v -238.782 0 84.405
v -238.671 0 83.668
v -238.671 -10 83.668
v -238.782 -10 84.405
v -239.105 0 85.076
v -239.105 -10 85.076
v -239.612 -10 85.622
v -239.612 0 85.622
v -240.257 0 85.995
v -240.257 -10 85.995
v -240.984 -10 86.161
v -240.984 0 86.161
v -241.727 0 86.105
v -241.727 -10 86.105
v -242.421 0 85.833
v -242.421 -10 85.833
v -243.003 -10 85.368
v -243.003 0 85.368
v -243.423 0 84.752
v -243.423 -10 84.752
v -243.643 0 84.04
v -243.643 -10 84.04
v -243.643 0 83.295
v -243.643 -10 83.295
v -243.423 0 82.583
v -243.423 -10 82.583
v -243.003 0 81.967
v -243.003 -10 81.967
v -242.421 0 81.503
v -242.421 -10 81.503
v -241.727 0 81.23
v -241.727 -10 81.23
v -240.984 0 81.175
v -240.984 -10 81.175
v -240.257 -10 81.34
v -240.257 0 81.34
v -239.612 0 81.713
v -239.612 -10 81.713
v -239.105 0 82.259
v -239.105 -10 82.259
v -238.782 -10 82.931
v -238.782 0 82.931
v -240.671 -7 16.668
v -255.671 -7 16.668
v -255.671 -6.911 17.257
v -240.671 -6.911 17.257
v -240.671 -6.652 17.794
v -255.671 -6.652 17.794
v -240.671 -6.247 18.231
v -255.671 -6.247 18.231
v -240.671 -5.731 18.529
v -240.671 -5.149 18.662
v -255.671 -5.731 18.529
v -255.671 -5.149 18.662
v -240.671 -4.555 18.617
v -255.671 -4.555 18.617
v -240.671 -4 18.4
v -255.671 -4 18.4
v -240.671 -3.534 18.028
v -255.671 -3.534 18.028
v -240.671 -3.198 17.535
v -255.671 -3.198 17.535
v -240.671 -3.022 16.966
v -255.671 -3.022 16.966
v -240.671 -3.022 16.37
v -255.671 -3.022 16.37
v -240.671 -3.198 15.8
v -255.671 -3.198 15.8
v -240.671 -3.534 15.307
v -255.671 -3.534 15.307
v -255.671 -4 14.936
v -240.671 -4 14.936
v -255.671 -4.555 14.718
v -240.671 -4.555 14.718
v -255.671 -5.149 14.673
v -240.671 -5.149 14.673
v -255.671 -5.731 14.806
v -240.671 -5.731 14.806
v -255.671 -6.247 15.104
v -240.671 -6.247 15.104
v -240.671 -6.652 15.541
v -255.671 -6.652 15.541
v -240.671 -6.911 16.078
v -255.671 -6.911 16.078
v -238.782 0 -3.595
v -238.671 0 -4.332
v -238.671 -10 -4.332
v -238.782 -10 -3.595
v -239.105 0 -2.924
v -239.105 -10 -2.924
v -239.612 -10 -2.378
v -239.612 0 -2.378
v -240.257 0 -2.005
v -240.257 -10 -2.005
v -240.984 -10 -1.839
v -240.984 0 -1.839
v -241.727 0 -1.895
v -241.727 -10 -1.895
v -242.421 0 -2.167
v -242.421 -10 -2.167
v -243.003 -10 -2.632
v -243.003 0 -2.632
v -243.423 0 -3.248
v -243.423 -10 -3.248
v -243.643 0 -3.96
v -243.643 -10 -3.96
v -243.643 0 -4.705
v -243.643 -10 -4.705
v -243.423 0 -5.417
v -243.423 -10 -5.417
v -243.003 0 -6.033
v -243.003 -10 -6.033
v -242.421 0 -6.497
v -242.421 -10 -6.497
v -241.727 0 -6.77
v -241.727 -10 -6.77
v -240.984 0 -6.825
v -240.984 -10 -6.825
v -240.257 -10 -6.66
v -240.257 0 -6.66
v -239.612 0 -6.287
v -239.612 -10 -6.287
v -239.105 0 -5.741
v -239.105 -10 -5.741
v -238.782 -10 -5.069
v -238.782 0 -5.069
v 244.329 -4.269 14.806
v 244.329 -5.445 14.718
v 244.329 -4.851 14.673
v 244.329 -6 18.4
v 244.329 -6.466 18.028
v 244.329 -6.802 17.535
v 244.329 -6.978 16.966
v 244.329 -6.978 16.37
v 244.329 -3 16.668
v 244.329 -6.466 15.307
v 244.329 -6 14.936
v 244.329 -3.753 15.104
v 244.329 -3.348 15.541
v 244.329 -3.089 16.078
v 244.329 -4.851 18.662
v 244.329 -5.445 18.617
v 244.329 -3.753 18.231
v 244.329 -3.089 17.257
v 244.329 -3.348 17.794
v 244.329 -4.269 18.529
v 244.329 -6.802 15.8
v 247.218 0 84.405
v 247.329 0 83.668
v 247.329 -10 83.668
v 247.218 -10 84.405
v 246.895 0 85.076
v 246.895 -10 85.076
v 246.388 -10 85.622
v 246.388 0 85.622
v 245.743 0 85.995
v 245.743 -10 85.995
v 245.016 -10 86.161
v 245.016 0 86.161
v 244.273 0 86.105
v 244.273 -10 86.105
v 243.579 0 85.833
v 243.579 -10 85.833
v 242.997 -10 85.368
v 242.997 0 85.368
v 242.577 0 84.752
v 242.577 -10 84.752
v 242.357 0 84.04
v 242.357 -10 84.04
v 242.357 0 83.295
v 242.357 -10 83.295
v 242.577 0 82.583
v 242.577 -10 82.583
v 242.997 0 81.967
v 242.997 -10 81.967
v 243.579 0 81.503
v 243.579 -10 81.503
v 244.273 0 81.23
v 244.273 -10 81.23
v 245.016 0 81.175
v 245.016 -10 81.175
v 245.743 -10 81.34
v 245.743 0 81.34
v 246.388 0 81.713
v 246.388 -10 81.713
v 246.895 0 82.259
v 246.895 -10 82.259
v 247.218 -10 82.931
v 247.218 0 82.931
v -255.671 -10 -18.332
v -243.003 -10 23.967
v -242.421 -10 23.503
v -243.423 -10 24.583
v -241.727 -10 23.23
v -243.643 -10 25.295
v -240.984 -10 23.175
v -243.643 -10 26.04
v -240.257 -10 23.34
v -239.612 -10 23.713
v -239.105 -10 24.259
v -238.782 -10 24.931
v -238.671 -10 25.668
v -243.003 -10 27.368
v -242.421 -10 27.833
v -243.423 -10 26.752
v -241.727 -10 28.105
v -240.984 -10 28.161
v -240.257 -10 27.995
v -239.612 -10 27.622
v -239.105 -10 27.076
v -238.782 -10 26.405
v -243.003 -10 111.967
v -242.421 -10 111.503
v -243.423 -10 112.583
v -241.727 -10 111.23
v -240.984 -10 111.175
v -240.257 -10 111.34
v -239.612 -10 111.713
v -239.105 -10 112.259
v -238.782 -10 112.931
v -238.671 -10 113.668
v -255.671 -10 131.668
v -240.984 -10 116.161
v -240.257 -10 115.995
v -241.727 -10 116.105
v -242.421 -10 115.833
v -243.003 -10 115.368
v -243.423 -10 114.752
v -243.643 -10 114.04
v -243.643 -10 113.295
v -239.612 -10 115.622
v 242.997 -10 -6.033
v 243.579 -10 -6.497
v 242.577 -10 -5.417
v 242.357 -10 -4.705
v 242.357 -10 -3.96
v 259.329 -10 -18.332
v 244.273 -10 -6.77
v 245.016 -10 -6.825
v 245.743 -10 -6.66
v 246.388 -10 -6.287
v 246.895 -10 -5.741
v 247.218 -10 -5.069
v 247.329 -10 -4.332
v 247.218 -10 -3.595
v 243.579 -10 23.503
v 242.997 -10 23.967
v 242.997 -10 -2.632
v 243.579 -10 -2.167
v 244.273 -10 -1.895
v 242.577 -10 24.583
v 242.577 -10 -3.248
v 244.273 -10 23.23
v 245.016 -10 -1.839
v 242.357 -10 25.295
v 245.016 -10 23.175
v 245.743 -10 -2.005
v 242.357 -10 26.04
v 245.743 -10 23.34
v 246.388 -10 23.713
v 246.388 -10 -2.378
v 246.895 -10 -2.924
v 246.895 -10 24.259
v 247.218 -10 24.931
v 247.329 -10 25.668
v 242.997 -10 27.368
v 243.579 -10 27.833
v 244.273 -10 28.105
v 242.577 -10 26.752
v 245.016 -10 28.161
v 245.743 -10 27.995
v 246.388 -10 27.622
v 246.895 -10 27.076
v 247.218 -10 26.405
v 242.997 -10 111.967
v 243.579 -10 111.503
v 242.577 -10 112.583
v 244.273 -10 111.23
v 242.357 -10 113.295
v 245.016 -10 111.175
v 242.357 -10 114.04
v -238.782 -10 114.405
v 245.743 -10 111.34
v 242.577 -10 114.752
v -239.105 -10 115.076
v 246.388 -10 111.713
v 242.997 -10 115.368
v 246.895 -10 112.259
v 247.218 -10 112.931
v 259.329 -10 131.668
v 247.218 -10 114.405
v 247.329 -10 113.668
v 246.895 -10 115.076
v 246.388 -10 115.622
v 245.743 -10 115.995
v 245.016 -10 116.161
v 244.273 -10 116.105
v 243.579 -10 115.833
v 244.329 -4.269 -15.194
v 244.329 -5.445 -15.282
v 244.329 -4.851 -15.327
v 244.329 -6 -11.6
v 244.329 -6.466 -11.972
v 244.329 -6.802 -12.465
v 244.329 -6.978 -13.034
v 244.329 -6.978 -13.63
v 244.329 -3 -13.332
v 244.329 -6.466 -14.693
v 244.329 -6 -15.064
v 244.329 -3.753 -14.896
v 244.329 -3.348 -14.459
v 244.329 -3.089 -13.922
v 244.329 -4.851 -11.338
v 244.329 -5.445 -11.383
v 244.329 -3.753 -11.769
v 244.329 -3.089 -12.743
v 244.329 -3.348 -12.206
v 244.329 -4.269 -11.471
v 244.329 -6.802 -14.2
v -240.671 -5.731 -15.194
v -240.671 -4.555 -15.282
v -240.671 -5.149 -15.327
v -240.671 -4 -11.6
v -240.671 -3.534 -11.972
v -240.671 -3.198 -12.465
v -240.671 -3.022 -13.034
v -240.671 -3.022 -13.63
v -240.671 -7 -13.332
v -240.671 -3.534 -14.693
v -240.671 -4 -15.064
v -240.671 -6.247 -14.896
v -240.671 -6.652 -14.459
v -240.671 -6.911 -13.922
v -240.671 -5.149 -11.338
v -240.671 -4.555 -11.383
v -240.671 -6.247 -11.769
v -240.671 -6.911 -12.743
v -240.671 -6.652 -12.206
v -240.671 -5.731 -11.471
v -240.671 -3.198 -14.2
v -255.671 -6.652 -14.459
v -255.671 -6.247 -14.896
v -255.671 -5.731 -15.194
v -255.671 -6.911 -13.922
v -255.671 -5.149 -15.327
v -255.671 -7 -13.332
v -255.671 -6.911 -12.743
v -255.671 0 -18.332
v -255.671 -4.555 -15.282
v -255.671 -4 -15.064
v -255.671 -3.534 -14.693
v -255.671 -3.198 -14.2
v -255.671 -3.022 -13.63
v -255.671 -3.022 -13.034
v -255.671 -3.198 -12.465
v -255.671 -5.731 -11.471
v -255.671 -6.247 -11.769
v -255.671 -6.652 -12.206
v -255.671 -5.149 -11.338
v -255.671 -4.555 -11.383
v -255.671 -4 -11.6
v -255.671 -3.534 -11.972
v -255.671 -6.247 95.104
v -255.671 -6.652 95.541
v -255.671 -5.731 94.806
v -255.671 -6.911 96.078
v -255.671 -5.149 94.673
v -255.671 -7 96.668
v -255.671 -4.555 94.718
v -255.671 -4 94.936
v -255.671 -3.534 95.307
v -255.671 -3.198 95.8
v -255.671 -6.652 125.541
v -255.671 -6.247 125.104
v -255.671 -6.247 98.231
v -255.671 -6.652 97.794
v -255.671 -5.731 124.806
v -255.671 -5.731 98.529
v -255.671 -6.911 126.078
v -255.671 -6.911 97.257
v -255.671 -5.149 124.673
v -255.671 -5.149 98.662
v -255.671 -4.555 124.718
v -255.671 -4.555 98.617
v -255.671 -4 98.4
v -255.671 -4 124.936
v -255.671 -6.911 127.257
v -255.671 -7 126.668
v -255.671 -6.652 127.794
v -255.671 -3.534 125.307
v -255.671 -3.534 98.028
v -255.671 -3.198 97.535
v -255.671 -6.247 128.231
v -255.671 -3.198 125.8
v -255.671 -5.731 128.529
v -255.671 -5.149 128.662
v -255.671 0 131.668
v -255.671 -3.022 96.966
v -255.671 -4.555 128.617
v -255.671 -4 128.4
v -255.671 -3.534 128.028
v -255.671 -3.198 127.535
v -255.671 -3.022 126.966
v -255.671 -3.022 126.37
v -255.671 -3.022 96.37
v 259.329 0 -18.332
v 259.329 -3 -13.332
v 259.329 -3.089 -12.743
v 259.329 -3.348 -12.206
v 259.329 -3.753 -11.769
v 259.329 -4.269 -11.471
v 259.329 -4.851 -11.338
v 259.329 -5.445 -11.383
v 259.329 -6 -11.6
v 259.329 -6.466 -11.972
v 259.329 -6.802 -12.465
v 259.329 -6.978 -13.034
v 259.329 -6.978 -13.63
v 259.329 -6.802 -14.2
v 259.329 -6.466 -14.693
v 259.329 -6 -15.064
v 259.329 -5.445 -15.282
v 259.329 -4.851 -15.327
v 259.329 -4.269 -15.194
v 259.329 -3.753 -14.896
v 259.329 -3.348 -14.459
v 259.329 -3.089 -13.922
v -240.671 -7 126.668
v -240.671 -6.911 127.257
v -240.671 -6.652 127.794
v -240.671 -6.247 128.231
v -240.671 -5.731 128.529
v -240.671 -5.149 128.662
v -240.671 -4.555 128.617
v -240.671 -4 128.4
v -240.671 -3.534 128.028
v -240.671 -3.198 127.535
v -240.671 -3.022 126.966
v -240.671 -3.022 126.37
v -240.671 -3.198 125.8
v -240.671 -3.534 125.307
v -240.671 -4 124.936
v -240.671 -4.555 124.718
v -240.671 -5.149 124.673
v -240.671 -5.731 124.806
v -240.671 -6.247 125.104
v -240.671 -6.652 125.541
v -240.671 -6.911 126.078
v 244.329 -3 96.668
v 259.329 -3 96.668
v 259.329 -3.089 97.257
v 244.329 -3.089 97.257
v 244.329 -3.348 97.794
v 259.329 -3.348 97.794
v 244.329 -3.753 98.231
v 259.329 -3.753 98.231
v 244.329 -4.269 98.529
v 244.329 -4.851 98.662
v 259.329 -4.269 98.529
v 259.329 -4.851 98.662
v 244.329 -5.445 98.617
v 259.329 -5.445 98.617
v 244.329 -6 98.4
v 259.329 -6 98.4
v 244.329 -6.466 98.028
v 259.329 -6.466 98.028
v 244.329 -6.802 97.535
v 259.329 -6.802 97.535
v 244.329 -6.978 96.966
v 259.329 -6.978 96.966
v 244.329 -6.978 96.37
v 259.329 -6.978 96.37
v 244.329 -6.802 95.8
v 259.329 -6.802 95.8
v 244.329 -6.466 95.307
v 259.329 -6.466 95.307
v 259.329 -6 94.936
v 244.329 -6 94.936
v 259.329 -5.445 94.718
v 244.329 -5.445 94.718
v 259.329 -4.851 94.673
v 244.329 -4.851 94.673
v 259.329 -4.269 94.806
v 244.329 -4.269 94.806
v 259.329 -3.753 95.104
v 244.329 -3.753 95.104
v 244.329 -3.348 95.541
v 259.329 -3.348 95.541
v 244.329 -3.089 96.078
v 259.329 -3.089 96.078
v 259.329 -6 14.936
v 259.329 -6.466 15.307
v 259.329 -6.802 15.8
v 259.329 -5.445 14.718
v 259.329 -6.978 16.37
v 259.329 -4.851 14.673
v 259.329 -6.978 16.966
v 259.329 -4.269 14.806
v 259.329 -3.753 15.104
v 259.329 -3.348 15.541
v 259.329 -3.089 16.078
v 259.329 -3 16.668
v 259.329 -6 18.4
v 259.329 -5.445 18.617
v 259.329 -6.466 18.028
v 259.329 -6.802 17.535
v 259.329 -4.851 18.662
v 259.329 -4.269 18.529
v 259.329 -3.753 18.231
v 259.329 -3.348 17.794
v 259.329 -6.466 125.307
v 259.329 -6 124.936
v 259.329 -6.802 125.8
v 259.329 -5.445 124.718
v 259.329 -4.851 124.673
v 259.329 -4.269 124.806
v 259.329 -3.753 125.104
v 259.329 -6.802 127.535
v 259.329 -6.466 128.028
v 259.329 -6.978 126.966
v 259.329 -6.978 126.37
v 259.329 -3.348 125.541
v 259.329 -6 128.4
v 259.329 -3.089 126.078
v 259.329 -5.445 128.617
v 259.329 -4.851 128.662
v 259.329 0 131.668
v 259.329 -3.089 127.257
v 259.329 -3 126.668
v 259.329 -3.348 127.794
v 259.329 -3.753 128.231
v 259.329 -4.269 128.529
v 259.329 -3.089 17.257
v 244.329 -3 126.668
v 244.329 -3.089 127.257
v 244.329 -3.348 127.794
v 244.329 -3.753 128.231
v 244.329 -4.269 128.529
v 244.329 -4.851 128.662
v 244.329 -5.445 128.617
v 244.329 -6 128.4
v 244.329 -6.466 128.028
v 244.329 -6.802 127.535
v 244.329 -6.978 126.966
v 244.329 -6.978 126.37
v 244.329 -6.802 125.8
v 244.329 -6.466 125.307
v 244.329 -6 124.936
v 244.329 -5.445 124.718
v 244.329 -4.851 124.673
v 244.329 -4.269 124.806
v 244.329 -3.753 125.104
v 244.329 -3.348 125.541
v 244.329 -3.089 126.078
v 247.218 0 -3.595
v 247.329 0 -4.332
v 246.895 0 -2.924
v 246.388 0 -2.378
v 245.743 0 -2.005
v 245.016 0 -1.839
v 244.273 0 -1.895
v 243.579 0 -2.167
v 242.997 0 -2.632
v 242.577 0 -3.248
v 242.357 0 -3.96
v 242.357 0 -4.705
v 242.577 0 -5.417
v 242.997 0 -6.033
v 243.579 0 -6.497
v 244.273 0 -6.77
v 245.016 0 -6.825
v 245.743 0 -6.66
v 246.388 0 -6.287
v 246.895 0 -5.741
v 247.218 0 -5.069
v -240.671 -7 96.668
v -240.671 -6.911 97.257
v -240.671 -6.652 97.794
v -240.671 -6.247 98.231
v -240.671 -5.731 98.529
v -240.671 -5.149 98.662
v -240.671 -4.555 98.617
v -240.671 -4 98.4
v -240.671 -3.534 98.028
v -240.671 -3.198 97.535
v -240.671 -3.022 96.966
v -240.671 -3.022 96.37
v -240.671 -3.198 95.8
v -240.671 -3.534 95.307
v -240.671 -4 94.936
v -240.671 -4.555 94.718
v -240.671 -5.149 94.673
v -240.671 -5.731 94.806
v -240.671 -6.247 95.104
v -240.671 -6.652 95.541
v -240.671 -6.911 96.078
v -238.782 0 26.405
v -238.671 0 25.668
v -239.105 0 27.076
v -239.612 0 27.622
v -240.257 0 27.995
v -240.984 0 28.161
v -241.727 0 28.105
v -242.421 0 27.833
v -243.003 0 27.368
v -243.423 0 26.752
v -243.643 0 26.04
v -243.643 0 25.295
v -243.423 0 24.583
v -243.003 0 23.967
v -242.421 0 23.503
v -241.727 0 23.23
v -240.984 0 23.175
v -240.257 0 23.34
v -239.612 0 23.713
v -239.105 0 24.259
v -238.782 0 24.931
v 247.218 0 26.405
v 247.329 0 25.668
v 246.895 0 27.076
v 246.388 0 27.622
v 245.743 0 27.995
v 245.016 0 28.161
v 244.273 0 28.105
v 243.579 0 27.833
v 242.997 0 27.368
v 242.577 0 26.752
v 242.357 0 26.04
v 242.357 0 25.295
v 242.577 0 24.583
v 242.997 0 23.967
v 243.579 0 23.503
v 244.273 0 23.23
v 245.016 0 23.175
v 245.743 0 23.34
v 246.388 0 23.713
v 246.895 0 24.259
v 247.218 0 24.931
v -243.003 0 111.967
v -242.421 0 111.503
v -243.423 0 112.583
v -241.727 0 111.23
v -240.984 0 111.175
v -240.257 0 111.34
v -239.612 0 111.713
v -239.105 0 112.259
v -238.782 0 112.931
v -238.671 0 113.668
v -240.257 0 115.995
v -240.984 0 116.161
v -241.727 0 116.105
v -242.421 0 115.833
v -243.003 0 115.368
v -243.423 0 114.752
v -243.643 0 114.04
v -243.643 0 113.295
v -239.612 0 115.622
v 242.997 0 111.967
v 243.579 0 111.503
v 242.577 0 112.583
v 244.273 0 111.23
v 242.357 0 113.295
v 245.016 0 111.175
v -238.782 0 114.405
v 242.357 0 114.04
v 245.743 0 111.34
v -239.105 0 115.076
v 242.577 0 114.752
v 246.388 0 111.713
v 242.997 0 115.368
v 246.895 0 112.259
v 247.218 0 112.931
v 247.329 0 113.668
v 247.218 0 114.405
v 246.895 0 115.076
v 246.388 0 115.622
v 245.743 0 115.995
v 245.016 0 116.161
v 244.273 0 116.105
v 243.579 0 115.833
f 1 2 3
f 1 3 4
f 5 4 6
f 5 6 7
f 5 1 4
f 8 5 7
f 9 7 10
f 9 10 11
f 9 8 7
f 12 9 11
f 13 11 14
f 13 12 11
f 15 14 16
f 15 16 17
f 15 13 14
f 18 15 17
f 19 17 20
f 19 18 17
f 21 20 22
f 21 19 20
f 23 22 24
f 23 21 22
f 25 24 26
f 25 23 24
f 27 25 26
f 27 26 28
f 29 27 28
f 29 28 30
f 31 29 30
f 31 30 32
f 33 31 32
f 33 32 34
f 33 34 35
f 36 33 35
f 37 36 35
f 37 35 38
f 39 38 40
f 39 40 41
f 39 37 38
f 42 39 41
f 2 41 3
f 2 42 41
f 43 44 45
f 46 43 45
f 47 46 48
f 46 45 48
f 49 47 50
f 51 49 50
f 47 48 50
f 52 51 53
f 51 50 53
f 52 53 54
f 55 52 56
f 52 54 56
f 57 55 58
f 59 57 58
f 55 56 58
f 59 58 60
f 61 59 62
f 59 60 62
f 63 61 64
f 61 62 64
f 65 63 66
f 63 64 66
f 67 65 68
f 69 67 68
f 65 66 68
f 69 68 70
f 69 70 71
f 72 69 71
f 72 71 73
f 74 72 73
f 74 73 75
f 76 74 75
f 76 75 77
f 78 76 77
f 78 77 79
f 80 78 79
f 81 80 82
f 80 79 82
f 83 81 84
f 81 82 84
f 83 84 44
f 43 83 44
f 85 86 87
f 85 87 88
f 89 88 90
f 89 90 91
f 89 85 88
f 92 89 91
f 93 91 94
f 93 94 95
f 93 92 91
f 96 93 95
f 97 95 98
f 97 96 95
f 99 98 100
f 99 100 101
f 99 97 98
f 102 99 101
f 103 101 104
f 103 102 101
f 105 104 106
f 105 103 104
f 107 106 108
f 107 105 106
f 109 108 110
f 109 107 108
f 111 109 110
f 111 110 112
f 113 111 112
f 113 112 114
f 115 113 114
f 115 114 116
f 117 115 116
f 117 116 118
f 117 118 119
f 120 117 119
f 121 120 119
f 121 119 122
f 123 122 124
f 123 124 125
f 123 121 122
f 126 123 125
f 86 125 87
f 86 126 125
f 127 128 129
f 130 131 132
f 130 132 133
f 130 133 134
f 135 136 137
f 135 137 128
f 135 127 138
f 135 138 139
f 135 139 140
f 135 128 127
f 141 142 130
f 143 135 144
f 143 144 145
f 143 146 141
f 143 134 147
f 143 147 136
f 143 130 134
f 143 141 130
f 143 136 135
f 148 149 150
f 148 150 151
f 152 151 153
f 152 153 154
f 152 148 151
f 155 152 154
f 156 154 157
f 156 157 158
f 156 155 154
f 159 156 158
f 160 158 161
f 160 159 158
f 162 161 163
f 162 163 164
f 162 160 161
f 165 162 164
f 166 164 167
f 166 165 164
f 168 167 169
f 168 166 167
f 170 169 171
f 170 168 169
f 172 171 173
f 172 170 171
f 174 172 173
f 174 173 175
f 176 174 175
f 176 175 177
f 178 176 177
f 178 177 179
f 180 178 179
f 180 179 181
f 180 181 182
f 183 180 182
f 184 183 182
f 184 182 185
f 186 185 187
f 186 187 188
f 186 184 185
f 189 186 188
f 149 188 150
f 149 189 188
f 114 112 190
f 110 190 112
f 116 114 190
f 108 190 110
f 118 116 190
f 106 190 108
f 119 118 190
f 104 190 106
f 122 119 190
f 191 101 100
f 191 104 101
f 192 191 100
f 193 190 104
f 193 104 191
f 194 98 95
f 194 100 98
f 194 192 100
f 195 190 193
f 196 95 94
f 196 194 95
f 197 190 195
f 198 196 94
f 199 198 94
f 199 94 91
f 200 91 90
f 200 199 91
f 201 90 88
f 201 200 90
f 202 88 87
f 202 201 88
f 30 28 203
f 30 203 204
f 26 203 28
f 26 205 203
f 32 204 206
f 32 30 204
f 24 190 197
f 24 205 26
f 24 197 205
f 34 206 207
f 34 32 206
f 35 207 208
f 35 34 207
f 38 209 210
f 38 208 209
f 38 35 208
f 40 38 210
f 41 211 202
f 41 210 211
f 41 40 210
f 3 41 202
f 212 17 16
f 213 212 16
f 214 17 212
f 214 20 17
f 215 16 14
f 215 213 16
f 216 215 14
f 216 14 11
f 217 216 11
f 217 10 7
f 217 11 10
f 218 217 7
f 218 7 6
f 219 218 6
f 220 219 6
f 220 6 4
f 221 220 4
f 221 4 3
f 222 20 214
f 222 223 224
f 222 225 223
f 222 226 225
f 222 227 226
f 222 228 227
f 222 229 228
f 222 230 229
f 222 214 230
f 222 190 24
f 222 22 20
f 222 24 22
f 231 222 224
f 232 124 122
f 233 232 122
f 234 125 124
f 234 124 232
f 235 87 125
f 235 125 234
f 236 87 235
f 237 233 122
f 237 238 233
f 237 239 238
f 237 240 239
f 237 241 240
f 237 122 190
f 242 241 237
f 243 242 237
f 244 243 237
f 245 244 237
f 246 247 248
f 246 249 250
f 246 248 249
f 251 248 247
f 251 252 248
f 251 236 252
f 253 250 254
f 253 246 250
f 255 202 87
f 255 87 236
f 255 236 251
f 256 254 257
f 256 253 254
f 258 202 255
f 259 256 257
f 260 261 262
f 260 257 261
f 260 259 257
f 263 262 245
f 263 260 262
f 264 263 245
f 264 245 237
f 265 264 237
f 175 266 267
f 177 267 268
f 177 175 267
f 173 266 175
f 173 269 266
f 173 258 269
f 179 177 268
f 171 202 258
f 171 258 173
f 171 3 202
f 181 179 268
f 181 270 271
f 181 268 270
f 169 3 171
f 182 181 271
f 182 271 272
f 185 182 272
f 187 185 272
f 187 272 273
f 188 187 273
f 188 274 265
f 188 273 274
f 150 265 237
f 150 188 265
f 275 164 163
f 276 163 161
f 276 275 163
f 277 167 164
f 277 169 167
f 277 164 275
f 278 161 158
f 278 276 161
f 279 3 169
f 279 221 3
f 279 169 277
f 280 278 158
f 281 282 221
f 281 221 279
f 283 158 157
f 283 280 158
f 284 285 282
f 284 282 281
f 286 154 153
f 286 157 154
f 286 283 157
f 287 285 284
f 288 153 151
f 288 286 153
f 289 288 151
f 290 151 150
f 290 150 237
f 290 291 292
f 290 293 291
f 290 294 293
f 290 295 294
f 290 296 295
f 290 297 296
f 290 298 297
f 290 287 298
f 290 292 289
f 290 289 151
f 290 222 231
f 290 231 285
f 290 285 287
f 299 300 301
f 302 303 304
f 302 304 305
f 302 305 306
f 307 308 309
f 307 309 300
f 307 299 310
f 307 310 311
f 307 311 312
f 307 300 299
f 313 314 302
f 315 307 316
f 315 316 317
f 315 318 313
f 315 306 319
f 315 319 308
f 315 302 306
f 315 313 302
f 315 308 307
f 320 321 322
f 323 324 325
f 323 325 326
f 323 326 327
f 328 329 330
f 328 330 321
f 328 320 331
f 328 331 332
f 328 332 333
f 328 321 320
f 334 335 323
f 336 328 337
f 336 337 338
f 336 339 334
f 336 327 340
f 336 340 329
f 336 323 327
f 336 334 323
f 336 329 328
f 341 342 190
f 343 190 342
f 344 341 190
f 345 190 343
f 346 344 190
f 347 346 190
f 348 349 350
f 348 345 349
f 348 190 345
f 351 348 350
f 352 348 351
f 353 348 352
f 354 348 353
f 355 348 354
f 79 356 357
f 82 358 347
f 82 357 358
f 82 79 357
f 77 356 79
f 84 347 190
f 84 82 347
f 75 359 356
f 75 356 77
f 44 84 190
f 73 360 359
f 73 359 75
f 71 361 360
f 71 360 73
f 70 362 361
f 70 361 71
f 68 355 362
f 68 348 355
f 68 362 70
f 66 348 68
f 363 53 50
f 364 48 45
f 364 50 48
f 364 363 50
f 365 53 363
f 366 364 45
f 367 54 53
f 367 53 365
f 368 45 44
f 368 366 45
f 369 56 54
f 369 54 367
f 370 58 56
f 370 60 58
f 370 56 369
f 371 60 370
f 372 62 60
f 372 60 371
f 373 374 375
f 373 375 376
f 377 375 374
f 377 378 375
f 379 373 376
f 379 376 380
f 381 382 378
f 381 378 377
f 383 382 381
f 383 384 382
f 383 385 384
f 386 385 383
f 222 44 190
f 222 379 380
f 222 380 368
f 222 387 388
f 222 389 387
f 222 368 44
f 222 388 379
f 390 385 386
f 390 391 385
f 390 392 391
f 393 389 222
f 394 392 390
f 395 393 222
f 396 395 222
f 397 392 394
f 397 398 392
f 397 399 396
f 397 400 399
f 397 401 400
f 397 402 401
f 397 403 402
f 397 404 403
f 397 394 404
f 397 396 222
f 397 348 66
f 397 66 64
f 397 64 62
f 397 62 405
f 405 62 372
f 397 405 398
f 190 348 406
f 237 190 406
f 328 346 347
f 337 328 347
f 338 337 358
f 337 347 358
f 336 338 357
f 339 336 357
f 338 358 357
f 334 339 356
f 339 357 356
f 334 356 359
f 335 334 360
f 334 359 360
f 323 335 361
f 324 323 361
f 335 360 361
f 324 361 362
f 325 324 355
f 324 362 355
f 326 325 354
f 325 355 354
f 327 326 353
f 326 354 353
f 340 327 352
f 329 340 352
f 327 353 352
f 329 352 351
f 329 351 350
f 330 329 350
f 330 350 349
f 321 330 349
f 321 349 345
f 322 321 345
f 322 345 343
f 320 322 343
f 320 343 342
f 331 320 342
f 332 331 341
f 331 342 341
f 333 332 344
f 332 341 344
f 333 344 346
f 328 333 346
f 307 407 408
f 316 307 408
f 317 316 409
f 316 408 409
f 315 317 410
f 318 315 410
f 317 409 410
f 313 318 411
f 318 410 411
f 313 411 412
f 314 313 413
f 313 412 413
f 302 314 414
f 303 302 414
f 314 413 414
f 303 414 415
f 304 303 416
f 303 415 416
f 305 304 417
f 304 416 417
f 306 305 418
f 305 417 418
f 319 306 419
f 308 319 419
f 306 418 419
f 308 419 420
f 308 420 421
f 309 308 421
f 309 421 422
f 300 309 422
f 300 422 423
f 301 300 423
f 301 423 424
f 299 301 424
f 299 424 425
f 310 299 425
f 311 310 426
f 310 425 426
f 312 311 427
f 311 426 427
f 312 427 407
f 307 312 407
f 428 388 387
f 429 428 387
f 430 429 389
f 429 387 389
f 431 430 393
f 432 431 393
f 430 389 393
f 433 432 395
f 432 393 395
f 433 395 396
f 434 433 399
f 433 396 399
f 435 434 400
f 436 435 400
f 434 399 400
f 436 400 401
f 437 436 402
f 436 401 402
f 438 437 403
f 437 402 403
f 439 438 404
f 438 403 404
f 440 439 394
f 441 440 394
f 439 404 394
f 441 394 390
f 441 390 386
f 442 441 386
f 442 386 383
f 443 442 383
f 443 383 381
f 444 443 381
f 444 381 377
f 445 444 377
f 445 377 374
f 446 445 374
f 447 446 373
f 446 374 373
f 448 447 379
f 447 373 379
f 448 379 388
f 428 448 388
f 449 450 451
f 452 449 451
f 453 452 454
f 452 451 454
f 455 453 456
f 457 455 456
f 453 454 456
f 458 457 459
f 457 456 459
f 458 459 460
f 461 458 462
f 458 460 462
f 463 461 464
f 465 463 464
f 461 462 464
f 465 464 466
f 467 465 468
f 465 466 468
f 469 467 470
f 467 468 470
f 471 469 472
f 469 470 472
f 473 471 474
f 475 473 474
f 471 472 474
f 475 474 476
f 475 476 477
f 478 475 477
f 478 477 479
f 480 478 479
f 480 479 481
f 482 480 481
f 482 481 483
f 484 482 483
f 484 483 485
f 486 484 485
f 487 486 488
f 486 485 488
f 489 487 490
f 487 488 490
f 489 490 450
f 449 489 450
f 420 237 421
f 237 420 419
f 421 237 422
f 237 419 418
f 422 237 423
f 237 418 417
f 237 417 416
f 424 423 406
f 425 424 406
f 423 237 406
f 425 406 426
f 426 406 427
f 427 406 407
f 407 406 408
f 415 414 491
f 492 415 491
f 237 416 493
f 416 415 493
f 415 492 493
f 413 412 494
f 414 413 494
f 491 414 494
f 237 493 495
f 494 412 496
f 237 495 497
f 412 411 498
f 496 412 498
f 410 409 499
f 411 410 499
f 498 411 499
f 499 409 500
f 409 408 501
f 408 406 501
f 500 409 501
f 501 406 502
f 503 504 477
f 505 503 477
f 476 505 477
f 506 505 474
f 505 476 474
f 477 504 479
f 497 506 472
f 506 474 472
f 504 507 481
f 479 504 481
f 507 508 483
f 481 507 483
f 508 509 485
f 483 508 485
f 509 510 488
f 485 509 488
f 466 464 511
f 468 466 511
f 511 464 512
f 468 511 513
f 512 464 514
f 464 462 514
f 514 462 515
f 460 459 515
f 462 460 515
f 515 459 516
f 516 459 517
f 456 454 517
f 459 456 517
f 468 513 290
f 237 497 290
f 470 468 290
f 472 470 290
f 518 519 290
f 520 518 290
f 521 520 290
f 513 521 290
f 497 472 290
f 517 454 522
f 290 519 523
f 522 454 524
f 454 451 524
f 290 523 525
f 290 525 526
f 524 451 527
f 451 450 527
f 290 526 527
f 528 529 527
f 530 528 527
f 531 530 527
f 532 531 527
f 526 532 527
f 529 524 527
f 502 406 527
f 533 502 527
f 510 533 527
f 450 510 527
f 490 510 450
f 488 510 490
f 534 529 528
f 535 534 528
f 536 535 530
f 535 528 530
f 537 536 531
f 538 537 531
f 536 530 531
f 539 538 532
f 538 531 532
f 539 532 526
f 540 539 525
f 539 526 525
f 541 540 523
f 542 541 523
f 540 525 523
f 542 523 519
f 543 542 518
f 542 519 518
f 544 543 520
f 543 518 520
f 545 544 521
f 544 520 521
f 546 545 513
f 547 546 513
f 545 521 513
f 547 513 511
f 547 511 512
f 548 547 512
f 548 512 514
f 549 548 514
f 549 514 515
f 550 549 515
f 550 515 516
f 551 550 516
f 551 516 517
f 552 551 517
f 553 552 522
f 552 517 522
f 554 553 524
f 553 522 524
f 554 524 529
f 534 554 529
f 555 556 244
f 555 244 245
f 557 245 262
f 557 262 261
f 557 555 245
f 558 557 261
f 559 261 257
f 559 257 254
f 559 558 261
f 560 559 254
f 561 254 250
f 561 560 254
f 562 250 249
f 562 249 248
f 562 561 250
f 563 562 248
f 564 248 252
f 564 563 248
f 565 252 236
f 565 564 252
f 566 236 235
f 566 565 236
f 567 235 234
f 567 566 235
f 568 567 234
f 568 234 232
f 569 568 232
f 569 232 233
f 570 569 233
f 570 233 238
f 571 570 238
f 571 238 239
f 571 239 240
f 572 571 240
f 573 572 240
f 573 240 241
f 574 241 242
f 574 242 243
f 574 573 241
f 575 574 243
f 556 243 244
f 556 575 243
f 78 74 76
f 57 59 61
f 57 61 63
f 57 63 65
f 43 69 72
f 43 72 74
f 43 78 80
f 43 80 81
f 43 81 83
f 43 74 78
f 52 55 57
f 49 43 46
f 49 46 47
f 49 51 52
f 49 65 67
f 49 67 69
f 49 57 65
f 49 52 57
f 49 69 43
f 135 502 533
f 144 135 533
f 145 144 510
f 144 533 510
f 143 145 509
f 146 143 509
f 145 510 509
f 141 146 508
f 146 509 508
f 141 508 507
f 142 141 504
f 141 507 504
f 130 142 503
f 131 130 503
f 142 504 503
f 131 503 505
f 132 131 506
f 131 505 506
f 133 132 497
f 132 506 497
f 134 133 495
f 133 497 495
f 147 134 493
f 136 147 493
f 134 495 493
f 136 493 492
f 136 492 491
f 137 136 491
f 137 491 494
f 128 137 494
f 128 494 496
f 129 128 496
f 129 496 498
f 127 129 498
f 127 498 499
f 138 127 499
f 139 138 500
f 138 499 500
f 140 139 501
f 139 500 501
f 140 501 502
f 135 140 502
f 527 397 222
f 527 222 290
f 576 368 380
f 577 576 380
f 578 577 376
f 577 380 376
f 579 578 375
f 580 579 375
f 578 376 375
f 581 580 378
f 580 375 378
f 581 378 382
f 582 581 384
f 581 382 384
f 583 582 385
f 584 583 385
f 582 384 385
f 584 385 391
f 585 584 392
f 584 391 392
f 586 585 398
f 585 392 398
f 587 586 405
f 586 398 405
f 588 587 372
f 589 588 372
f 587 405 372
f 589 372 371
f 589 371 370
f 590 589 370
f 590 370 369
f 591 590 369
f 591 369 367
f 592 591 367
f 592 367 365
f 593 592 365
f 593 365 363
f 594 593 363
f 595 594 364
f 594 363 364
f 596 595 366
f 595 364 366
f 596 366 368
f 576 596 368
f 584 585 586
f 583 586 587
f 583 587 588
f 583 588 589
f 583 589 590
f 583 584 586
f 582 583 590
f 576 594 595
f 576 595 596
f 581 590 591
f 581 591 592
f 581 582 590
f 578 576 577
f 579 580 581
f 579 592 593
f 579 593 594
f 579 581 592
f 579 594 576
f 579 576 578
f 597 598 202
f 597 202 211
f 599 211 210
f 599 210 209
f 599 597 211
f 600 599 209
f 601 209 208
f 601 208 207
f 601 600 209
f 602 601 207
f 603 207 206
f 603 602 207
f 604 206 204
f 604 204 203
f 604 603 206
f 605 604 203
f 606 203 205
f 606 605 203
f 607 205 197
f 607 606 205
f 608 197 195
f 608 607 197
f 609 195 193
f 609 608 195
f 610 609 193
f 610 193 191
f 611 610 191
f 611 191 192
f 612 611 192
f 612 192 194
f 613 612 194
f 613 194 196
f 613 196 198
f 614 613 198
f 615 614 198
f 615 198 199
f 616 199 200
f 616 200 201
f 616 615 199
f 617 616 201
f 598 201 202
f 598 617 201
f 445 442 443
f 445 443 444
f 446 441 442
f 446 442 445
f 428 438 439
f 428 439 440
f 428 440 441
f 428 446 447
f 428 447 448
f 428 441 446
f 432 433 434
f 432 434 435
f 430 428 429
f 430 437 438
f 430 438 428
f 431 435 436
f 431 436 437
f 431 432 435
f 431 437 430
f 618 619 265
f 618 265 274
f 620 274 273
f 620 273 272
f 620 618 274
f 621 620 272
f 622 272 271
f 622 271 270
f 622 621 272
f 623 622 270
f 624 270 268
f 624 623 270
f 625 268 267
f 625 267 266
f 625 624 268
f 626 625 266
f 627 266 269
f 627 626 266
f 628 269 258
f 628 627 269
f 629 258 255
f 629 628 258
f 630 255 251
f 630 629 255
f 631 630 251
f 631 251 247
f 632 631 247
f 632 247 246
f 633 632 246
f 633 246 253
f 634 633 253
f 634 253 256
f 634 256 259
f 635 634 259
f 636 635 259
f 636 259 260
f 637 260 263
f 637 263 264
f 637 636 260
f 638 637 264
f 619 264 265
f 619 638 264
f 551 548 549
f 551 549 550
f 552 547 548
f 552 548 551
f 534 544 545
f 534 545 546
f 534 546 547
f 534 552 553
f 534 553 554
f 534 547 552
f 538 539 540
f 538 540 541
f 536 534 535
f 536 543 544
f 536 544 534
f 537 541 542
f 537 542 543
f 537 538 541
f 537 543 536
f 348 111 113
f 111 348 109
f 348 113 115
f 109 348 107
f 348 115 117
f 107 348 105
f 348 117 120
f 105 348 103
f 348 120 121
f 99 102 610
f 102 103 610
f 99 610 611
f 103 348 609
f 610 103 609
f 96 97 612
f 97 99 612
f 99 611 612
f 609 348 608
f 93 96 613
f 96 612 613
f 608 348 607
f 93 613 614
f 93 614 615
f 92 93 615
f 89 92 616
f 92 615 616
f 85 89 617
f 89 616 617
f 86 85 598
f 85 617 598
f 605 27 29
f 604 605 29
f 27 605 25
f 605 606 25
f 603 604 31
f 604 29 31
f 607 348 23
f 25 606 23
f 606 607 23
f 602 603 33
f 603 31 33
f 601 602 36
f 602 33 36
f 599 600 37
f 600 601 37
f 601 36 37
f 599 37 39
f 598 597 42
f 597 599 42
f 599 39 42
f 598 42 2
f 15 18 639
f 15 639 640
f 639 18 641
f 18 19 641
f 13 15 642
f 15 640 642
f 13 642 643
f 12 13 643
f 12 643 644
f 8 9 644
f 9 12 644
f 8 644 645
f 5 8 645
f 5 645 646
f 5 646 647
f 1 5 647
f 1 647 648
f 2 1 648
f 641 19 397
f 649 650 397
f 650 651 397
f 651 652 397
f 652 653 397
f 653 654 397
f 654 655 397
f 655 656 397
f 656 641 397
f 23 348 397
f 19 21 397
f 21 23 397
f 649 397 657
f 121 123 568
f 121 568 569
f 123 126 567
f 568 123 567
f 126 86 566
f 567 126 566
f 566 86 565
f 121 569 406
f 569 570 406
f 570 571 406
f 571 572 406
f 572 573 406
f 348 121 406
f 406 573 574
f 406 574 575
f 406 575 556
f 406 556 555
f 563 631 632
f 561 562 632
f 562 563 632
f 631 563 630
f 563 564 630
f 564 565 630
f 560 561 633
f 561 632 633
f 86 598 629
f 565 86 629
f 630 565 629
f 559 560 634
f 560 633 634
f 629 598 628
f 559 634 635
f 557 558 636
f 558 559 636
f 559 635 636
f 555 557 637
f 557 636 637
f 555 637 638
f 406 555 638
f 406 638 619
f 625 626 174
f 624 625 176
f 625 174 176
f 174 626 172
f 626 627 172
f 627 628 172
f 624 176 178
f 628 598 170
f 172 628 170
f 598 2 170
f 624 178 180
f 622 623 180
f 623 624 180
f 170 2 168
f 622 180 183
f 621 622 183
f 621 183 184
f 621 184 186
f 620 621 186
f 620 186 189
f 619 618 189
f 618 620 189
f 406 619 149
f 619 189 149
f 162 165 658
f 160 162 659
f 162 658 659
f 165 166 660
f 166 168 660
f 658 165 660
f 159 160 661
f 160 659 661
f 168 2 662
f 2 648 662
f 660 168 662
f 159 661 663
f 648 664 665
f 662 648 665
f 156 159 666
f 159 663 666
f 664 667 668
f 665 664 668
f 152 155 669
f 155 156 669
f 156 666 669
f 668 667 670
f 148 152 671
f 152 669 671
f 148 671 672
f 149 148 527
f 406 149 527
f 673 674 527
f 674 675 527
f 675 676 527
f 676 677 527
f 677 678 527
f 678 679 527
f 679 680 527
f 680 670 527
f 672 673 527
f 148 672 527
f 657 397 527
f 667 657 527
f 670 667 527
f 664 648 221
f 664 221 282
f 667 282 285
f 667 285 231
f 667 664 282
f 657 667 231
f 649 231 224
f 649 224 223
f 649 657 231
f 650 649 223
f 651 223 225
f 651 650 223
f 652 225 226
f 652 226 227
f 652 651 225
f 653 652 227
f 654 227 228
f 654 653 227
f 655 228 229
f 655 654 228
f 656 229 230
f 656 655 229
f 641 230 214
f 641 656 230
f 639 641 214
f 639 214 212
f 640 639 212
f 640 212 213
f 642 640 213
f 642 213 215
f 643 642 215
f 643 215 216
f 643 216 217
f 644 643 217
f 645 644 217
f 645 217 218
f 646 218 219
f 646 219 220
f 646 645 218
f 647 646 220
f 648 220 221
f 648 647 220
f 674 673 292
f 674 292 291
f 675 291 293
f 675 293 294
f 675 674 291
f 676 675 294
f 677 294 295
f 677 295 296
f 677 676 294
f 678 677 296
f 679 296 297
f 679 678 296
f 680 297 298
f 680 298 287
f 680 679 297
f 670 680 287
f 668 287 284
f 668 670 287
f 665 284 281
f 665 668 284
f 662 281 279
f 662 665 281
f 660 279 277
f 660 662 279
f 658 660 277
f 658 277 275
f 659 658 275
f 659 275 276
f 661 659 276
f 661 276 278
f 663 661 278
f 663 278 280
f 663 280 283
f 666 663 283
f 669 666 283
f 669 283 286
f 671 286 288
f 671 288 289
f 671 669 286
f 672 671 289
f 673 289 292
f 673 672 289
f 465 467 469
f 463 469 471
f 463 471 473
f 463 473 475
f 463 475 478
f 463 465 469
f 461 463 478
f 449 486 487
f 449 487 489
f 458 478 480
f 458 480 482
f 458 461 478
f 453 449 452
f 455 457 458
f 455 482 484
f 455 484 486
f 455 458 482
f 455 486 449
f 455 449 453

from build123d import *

# Parameters (mm, degrees)
F0_W     = 515
F0_H     = 150
F0_R     = 2.5
F1_DEPTH = 10
F2_R     = 2
F3_DEPTH = 15
F4_R     = 2
F5_DEPTH = 15


with BuildPart() as f1:
    # F0 (on Front) → F1 (new body)
    with BuildSketch(Plane.XZ):
        with Locations((1.829247, 56.667644)):
            Rectangle(F0_W, F0_H)
        with Locations((-241.170753, -4.332356)):
            Circle(F0_R, mode=Mode.SUBTRACT)
        with Locations((-241.170753, 25.667644)):
            Circle(F0_R, mode=Mode.SUBTRACT)
        with Locations((244.829247, -4.332356)):
            Circle(F0_R, mode=Mode.SUBTRACT)
        with Locations((244.829247, 25.667644)):
            Circle(F0_R, mode=Mode.SUBTRACT)
        with Locations((-241.170753, 83.667644)):
            Circle(F0_R, mode=Mode.SUBTRACT)
        with Locations((-241.170753, 113.667644)):
            Circle(F0_R, mode=Mode.SUBTRACT)
        with Locations((244.829247, 83.667644)):
            Circle(F0_R, mode=Mode.SUBTRACT)
        with Locations((244.829247, 113.667644)):
            Circle(F0_R, mode=Mode.SUBTRACT)
    extrude(amount=F1_DEPTH)

    # F2 (on face) → F3 (cut)
    with BuildSketch(Plane(origin=(-255.670753, 0, 0), x_dir=(0, -1, 0), z_dir=(-1, 0, 0))):
        with Locations((5, -13.332356)):
            Circle(F2_R)
        with Locations((5, 126.667644)):
            Circle(F2_R)
        with Locations((5, 96.667644)):
            Circle(F2_R)
        with Locations((5, 16.667644)):
            Circle(F2_R)
    extrude(amount=-F3_DEPTH, mode=Mode.SUBTRACT)

    # F4 (on face) → F5 (cut)
    with BuildSketch(Plane.YZ.offset(259.329247)):
        with Locations((-5, 96.667644)):
            Circle(F4_R)
        with Locations((-5, -13.332356)):
            Circle(F4_R)
        with Locations((-5, 126.667644)):
            Circle(F4_R)
        with Locations((-5, 16.667644)):
            Circle(F4_R)
    extrude(amount=-F5_DEPTH, mode=Mode.SUBTRACT)


solid = f1.part
